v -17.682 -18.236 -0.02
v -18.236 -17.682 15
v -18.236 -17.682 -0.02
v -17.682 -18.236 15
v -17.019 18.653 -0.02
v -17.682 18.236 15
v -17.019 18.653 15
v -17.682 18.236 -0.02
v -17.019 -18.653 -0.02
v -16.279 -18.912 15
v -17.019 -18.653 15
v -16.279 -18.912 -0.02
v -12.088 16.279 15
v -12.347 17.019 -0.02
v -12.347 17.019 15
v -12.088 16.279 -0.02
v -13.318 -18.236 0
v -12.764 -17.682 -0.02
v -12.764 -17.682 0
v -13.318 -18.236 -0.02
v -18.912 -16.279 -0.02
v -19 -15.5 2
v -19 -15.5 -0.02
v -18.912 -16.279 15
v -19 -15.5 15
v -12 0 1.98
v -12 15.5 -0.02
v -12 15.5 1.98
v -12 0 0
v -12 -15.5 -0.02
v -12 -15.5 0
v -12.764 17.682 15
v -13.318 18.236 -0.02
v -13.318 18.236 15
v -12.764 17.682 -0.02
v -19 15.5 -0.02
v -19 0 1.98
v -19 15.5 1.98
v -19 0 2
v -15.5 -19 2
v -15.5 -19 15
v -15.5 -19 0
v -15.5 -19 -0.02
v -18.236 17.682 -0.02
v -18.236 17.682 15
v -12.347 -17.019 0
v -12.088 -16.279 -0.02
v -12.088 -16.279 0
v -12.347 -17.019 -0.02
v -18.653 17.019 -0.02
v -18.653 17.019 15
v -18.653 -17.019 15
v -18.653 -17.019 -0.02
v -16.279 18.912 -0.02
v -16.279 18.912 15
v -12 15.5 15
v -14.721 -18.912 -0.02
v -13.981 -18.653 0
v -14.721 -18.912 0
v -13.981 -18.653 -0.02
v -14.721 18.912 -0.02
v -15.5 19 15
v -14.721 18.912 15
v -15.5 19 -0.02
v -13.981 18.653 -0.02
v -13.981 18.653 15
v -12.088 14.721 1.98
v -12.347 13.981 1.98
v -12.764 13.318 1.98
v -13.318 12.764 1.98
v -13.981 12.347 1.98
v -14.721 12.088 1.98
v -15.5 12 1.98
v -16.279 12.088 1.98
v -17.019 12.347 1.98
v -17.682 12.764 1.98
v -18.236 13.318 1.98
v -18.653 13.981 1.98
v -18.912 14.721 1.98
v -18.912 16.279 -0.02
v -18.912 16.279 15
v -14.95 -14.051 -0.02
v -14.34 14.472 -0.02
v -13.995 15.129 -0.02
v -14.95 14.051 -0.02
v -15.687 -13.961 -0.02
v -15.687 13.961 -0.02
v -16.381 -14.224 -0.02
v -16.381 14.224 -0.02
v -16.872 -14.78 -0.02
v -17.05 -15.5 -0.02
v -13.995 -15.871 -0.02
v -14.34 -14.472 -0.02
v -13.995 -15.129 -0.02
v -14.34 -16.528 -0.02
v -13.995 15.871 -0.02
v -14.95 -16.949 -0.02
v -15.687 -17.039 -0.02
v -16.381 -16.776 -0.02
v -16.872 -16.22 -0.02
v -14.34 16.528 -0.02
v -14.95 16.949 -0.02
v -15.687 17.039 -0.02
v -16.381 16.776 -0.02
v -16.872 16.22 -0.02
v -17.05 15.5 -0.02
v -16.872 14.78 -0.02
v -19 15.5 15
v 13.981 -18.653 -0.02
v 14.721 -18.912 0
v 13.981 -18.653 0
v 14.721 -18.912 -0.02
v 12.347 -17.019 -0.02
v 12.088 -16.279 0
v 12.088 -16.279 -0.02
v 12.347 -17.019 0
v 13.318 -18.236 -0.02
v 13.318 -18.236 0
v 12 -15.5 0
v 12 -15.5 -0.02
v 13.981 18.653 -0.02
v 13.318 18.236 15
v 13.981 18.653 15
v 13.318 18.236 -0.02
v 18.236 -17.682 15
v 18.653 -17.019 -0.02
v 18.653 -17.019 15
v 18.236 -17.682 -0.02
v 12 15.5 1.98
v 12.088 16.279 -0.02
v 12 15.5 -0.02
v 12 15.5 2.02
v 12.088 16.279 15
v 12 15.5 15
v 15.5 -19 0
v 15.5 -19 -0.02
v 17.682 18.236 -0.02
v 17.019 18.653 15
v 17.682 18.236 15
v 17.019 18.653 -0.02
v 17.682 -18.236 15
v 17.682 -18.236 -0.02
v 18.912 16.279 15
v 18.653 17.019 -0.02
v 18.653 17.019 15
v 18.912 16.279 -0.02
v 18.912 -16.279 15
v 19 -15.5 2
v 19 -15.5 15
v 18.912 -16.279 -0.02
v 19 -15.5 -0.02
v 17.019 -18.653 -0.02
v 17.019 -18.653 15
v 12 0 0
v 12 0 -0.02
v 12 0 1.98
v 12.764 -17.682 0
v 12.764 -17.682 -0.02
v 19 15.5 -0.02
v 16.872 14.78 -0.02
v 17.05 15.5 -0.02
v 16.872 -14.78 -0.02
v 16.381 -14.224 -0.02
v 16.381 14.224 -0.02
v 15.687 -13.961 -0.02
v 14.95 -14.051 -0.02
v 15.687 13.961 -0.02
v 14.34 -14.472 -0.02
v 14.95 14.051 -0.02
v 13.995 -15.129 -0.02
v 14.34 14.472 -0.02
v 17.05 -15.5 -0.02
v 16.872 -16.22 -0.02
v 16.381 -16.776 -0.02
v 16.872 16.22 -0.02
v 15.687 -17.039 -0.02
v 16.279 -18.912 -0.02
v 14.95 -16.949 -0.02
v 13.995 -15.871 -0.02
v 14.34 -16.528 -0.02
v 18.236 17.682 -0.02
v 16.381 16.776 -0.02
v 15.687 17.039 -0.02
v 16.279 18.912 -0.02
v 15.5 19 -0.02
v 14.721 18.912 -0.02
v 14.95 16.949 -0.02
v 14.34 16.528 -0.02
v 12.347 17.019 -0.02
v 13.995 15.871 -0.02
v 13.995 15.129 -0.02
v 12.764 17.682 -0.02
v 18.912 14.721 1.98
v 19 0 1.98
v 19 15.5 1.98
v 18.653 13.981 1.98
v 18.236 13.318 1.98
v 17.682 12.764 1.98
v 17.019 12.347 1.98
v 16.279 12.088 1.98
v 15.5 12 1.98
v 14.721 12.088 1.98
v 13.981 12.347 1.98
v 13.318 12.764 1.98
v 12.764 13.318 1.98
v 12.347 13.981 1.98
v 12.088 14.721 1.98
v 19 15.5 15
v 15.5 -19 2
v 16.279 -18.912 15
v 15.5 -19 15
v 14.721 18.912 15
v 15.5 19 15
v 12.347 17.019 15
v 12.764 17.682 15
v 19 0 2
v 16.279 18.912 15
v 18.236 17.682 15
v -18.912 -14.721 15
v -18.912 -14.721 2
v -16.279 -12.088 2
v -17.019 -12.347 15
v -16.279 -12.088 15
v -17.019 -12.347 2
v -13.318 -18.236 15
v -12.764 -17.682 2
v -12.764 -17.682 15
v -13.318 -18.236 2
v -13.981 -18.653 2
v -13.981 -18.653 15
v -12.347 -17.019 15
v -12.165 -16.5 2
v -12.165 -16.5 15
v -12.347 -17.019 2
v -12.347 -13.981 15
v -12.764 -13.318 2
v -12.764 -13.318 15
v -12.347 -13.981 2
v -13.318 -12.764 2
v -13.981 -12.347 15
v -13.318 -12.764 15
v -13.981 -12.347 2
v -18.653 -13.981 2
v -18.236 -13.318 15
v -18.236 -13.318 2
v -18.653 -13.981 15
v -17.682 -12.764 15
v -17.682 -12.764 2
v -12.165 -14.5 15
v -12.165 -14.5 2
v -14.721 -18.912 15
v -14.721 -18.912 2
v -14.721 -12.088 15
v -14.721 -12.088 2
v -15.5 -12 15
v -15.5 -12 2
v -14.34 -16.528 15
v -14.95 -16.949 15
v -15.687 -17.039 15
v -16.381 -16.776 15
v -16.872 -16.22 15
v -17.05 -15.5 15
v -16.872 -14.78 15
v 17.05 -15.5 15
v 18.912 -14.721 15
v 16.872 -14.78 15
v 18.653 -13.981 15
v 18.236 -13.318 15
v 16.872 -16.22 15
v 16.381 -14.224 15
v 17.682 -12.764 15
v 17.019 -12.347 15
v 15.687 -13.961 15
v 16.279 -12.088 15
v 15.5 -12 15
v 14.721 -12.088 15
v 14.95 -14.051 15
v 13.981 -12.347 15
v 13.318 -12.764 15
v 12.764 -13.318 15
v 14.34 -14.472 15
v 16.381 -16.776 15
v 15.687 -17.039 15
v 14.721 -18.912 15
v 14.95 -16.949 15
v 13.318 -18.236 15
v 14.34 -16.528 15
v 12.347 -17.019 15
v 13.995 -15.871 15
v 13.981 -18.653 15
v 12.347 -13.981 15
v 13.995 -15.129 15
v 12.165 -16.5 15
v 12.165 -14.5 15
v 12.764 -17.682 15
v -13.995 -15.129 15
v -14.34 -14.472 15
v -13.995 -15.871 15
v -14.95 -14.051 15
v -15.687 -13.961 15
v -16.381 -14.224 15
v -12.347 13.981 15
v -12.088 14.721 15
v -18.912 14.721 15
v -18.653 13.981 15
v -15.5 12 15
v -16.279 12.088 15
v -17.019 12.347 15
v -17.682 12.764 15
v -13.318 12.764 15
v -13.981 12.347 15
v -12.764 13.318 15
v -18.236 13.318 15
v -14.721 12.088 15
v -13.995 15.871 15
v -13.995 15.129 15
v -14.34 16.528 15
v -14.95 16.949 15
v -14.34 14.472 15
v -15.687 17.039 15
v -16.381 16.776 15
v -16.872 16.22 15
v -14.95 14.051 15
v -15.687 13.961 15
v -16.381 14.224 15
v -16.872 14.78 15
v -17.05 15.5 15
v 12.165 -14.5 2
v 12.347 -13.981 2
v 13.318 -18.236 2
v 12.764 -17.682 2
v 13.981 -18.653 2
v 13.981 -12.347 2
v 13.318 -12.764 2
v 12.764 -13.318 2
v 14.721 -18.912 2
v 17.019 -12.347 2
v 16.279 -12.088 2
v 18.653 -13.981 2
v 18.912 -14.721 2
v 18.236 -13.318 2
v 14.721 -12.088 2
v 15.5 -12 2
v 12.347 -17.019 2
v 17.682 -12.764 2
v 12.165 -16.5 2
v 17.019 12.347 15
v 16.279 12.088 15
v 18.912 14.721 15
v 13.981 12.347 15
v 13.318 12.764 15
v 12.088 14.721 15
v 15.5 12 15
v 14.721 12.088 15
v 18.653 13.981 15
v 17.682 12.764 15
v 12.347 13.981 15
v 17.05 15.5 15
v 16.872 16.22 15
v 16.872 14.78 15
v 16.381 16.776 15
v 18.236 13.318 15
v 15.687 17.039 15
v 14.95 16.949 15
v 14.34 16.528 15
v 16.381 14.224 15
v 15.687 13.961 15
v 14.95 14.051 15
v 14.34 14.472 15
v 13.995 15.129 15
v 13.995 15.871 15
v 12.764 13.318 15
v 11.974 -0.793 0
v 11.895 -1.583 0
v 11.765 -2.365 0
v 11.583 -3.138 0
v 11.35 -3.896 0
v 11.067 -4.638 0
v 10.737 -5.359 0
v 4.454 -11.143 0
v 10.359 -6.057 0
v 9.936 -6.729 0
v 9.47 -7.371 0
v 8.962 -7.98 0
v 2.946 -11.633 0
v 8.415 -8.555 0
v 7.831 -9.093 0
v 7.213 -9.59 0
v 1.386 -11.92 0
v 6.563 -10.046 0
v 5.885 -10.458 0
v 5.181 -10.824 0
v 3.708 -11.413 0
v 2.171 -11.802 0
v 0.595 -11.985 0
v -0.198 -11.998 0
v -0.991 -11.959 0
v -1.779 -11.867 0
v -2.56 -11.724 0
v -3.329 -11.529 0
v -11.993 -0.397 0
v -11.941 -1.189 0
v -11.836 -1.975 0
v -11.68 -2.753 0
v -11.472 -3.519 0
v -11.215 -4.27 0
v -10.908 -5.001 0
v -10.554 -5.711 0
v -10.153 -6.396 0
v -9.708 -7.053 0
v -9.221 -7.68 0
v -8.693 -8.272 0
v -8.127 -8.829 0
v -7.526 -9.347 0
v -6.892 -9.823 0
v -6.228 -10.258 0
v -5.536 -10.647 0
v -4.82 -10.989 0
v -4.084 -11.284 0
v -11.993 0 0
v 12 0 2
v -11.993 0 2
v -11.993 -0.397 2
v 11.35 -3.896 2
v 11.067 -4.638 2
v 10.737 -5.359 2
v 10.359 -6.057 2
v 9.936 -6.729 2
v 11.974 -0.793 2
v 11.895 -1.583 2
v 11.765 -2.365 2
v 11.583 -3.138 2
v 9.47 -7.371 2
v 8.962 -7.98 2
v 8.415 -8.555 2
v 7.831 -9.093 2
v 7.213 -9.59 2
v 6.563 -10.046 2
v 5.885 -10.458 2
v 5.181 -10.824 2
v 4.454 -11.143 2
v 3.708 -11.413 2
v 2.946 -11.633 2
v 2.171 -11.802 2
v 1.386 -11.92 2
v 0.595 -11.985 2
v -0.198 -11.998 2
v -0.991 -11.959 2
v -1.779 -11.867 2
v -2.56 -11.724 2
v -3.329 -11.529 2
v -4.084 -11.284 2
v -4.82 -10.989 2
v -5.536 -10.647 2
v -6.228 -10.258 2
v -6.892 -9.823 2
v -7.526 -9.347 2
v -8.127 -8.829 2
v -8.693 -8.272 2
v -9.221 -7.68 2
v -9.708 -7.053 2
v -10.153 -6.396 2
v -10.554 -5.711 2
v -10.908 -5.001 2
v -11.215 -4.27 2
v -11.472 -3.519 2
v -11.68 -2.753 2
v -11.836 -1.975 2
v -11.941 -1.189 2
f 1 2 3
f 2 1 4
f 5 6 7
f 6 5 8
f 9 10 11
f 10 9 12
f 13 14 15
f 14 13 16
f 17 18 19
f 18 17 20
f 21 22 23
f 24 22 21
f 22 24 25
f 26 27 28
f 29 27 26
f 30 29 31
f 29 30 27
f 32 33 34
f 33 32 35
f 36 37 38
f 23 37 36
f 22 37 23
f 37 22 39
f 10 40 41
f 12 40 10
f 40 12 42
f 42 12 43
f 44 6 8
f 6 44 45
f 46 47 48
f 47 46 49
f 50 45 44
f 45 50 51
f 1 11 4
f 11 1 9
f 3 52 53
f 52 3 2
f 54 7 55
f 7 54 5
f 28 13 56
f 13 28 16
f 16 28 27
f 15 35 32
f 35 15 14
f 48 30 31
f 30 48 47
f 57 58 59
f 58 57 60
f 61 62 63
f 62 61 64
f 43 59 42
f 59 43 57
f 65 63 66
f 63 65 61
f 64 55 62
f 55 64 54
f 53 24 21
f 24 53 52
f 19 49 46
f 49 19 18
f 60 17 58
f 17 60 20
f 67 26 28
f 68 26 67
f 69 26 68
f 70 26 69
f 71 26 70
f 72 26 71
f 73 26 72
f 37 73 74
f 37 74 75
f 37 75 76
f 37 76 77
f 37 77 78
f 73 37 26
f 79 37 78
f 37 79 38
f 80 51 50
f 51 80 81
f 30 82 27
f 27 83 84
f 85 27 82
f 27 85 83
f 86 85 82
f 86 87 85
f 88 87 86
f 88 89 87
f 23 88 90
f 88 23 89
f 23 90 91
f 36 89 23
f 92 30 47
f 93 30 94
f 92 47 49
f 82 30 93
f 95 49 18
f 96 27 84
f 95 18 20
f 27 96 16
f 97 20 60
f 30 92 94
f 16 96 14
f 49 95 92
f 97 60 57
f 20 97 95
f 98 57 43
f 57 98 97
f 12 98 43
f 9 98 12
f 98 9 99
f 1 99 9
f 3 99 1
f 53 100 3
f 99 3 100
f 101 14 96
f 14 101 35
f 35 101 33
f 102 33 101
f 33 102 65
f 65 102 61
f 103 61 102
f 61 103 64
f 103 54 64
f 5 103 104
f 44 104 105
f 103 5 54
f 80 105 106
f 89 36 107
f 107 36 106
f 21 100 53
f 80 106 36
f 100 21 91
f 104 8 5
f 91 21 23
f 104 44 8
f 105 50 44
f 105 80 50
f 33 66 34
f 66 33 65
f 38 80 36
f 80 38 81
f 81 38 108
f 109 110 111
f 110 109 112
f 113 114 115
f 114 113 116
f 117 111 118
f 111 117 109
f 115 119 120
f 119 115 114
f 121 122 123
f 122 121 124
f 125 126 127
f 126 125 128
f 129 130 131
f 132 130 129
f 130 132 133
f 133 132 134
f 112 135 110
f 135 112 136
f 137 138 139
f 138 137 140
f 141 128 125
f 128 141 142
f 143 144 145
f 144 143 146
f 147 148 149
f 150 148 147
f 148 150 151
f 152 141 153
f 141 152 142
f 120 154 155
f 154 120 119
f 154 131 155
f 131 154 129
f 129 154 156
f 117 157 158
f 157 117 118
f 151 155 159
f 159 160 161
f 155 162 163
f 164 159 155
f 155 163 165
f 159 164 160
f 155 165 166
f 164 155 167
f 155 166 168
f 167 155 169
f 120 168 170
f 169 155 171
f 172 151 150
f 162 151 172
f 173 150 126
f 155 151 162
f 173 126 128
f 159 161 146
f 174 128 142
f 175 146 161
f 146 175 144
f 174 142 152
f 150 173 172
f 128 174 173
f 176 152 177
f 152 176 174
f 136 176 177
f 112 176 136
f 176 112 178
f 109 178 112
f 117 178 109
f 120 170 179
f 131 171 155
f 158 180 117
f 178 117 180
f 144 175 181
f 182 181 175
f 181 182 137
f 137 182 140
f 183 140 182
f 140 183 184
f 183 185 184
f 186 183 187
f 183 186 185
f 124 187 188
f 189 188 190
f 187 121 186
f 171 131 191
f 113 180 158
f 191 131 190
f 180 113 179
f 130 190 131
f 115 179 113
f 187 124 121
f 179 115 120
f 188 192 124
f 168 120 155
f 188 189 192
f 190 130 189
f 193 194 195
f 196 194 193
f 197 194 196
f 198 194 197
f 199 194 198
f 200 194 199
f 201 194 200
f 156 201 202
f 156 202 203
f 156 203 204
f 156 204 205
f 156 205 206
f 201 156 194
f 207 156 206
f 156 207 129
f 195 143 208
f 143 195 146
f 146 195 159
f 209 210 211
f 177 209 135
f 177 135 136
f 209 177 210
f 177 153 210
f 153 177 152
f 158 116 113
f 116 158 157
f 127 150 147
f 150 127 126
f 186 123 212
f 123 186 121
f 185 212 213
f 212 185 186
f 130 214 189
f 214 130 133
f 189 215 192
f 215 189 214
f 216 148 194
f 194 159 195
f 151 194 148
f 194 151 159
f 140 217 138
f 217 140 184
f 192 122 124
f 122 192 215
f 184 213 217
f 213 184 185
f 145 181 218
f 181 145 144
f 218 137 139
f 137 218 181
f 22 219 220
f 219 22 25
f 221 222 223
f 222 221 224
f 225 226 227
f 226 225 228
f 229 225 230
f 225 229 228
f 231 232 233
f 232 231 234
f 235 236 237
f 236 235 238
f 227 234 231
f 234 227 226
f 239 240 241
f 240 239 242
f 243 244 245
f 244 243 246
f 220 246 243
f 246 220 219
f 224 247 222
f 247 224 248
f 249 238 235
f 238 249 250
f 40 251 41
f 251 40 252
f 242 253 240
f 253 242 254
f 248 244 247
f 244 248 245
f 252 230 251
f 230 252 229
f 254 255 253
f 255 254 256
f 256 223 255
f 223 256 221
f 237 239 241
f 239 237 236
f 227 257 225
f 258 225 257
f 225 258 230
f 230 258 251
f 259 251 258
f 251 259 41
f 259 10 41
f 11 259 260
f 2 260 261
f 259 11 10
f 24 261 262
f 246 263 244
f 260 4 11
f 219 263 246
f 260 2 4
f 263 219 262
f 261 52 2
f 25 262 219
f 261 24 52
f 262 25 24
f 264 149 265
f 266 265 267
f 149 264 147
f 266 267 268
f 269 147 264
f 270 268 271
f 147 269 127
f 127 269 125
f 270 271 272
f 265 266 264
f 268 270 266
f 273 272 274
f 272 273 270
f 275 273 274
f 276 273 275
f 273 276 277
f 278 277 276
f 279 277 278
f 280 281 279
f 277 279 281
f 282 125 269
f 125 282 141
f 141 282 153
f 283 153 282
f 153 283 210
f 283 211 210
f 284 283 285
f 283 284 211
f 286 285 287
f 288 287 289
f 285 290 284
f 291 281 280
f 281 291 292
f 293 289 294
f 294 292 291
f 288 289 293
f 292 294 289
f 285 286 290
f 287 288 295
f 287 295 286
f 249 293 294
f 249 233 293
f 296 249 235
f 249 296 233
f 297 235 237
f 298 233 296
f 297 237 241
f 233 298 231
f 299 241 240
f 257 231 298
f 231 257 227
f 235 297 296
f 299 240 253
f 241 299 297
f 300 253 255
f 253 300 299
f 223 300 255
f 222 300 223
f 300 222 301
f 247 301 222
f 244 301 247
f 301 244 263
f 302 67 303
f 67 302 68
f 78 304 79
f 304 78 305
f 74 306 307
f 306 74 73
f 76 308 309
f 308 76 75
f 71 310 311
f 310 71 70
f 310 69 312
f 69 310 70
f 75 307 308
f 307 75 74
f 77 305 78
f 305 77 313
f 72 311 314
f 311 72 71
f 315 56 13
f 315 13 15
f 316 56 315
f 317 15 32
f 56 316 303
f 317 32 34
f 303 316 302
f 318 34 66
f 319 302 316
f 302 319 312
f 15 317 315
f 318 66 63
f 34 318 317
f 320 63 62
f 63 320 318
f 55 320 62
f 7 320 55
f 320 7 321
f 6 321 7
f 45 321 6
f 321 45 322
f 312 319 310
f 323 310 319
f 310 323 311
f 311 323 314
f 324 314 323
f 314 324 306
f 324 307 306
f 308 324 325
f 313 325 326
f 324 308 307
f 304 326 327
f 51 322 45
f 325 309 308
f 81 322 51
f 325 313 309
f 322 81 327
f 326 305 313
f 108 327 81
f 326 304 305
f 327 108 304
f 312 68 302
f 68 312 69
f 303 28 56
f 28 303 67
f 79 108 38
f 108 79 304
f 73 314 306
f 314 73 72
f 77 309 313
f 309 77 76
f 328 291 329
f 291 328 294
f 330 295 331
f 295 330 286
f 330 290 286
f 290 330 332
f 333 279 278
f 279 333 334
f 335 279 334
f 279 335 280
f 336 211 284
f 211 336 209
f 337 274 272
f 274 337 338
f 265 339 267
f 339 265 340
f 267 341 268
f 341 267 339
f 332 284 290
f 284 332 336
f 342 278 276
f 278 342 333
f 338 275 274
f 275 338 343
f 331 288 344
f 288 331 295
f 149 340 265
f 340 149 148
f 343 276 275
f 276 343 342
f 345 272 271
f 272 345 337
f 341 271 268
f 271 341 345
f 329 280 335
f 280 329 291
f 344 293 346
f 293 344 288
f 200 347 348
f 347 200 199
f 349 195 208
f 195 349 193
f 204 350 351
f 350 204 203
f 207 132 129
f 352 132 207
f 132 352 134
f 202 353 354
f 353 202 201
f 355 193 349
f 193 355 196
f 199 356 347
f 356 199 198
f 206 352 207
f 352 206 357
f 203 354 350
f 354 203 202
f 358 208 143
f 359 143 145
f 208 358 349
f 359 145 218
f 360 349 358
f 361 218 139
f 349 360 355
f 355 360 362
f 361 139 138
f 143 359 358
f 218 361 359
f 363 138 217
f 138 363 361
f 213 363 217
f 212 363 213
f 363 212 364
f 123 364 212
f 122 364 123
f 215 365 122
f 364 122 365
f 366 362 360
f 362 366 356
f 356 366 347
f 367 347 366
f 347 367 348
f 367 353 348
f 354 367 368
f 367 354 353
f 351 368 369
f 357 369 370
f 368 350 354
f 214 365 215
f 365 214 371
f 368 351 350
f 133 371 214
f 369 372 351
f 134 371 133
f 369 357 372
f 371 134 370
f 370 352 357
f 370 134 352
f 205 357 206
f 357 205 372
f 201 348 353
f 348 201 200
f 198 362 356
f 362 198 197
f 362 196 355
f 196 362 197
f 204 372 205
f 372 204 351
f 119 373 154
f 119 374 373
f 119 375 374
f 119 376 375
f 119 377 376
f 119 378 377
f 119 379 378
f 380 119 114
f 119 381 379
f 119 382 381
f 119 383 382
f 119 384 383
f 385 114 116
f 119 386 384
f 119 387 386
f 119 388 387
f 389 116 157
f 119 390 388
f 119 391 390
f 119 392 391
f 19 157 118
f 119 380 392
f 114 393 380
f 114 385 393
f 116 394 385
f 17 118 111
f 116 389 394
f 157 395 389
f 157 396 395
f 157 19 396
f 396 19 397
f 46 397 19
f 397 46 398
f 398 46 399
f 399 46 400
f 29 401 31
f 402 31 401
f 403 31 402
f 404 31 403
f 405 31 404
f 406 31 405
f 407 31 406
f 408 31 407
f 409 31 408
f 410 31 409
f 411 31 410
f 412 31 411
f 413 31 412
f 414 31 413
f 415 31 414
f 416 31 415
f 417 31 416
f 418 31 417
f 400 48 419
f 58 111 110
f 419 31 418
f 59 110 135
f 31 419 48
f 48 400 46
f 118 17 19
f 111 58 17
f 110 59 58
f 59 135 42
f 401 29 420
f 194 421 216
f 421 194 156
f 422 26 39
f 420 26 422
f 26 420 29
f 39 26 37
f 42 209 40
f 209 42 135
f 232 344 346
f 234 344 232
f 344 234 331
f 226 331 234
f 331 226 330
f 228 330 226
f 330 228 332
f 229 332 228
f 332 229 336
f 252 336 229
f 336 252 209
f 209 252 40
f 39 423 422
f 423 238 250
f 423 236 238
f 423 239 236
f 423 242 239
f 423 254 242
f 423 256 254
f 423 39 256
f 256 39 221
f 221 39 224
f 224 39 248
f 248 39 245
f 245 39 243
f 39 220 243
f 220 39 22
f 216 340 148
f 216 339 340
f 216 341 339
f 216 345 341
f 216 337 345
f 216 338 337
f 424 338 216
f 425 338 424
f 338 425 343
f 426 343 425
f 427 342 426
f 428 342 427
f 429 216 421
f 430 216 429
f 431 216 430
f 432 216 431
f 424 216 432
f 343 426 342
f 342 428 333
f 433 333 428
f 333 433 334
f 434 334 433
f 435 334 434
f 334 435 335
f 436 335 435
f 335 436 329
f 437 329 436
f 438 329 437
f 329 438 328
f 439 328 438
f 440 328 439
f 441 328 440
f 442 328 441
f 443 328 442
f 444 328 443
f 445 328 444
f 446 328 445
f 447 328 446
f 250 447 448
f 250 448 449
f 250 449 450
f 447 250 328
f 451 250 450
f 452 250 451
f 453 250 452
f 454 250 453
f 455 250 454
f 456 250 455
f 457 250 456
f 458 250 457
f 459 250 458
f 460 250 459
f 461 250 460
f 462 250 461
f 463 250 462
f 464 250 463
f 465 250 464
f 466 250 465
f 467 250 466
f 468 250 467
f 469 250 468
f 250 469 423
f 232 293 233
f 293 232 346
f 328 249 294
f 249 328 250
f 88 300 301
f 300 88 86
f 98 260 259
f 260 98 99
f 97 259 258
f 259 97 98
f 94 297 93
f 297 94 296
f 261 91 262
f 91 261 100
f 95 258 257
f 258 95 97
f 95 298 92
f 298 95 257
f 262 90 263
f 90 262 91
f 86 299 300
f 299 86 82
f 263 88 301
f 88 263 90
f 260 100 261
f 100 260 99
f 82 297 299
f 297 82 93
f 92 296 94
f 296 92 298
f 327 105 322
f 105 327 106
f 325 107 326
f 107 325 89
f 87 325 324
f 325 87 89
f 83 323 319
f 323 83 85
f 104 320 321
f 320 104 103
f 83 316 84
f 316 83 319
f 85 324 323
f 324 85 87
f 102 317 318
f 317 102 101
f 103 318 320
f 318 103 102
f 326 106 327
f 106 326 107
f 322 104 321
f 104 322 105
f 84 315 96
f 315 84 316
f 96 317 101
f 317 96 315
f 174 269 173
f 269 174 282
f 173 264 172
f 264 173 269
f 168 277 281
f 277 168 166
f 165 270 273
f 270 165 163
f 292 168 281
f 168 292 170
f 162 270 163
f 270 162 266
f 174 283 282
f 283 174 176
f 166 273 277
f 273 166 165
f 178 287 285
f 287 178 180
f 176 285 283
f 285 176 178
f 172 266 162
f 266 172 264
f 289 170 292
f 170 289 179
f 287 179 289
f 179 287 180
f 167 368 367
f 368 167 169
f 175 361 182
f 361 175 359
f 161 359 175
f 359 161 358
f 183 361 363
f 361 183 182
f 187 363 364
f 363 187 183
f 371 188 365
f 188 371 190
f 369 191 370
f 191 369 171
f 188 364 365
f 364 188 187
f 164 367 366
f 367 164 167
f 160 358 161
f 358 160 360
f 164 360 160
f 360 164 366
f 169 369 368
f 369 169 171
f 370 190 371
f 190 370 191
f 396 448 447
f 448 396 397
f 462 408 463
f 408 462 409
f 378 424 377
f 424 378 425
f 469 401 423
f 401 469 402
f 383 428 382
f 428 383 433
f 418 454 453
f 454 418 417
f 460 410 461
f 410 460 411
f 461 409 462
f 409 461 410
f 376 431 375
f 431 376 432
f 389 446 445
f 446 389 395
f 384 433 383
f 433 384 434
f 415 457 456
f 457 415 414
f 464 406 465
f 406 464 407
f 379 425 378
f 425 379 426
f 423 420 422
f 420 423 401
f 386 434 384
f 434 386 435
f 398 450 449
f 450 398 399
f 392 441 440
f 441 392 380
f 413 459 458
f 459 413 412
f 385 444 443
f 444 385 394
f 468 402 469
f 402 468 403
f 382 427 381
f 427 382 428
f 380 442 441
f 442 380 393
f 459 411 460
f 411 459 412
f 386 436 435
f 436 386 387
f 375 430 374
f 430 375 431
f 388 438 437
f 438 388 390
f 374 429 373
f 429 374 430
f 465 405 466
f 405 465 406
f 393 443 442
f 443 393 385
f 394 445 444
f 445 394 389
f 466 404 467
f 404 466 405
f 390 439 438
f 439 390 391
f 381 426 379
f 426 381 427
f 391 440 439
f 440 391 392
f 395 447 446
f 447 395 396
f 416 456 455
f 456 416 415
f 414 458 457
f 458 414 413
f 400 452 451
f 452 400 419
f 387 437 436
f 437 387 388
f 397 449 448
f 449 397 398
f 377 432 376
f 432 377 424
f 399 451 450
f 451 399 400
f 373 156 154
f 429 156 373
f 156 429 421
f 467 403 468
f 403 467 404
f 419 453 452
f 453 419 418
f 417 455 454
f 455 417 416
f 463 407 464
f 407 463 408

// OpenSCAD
//
// nema stepper motor spacer (rev 1) - 20170831-121947
//
// (c)Jeremie Francois (jeremie.francois@gmail.com)
//	http://www.thingiverse.com/MoonCactus
//	http://www.tridimake.com
//
// Licence: Attribution - Share Alike - Creative Commons
//

// Spacing with the wall (overall height)
tower_h= 15;

// Diameter of the columns
tower_d= 7;

// Thickness of the base plate
base_h= 2;

// Diameter of the screw holes
screw_d= 3.1;

// Nema stepper properties http://www.mosaic-industries.com/embedded-systems/microcontroller-projects/stepper-motors/specifications
screw_spacing= 31.0;

// Space between the arms
void_d= screw_spacing - tower_d;

// Size of facets (lower=finer)
$fs= 0+0.8;
$fa= 0+0.8;


difference()
{
    
    union()
    {
		// Baseplate
        hull()
			for(x=[-1,+1]) for(y=[-1,0]) scale([x,y,1])
				translate([screw_spacing/2,screw_spacing/2,0])
					cylinder(d= tower_d, h= base_h);
		// Rounded arms
		for(x=[-1,+1]) hull() for(y=[-1,+1]) scale([x,y,1])
			translate([screw_spacing/2,screw_spacing/2,-tol])
				cylinder(d= tower_d, h= base_h);

		// Columns
        for(x=[-1,+1]) for(y=[-1,+1]) scale([x,y,1])
            translate([screw_spacing/2,screw_spacing/2,0])
                cylinder(d= tower_d, h= tower_h);

		// Bottom wall
        hull()
			for(x=[-1,+1]) for(y=[-1]) scale([x,y,1])
				translate([screw_spacing/2,screw_spacing/2,0])
					cylinder(d= 2, h= tower_h);
    }


    
	// Screw holes
    for(x=[-1,+1]) for(y=[-1,+1]) scale([x,y,1])
        translate([screw_spacing/2,screw_spacing/2,-tol])
            cylinder(d= screw_d, h= tower_h+2*tol);

	// Void between the arms
    translate([0,0,-tol])
    hull()
    {
		for(t=[0,20])
			translate([0,t,0])
				cylinder(d=void_d,h=base_h+2*tol);
    }
}

tol=0.02;
